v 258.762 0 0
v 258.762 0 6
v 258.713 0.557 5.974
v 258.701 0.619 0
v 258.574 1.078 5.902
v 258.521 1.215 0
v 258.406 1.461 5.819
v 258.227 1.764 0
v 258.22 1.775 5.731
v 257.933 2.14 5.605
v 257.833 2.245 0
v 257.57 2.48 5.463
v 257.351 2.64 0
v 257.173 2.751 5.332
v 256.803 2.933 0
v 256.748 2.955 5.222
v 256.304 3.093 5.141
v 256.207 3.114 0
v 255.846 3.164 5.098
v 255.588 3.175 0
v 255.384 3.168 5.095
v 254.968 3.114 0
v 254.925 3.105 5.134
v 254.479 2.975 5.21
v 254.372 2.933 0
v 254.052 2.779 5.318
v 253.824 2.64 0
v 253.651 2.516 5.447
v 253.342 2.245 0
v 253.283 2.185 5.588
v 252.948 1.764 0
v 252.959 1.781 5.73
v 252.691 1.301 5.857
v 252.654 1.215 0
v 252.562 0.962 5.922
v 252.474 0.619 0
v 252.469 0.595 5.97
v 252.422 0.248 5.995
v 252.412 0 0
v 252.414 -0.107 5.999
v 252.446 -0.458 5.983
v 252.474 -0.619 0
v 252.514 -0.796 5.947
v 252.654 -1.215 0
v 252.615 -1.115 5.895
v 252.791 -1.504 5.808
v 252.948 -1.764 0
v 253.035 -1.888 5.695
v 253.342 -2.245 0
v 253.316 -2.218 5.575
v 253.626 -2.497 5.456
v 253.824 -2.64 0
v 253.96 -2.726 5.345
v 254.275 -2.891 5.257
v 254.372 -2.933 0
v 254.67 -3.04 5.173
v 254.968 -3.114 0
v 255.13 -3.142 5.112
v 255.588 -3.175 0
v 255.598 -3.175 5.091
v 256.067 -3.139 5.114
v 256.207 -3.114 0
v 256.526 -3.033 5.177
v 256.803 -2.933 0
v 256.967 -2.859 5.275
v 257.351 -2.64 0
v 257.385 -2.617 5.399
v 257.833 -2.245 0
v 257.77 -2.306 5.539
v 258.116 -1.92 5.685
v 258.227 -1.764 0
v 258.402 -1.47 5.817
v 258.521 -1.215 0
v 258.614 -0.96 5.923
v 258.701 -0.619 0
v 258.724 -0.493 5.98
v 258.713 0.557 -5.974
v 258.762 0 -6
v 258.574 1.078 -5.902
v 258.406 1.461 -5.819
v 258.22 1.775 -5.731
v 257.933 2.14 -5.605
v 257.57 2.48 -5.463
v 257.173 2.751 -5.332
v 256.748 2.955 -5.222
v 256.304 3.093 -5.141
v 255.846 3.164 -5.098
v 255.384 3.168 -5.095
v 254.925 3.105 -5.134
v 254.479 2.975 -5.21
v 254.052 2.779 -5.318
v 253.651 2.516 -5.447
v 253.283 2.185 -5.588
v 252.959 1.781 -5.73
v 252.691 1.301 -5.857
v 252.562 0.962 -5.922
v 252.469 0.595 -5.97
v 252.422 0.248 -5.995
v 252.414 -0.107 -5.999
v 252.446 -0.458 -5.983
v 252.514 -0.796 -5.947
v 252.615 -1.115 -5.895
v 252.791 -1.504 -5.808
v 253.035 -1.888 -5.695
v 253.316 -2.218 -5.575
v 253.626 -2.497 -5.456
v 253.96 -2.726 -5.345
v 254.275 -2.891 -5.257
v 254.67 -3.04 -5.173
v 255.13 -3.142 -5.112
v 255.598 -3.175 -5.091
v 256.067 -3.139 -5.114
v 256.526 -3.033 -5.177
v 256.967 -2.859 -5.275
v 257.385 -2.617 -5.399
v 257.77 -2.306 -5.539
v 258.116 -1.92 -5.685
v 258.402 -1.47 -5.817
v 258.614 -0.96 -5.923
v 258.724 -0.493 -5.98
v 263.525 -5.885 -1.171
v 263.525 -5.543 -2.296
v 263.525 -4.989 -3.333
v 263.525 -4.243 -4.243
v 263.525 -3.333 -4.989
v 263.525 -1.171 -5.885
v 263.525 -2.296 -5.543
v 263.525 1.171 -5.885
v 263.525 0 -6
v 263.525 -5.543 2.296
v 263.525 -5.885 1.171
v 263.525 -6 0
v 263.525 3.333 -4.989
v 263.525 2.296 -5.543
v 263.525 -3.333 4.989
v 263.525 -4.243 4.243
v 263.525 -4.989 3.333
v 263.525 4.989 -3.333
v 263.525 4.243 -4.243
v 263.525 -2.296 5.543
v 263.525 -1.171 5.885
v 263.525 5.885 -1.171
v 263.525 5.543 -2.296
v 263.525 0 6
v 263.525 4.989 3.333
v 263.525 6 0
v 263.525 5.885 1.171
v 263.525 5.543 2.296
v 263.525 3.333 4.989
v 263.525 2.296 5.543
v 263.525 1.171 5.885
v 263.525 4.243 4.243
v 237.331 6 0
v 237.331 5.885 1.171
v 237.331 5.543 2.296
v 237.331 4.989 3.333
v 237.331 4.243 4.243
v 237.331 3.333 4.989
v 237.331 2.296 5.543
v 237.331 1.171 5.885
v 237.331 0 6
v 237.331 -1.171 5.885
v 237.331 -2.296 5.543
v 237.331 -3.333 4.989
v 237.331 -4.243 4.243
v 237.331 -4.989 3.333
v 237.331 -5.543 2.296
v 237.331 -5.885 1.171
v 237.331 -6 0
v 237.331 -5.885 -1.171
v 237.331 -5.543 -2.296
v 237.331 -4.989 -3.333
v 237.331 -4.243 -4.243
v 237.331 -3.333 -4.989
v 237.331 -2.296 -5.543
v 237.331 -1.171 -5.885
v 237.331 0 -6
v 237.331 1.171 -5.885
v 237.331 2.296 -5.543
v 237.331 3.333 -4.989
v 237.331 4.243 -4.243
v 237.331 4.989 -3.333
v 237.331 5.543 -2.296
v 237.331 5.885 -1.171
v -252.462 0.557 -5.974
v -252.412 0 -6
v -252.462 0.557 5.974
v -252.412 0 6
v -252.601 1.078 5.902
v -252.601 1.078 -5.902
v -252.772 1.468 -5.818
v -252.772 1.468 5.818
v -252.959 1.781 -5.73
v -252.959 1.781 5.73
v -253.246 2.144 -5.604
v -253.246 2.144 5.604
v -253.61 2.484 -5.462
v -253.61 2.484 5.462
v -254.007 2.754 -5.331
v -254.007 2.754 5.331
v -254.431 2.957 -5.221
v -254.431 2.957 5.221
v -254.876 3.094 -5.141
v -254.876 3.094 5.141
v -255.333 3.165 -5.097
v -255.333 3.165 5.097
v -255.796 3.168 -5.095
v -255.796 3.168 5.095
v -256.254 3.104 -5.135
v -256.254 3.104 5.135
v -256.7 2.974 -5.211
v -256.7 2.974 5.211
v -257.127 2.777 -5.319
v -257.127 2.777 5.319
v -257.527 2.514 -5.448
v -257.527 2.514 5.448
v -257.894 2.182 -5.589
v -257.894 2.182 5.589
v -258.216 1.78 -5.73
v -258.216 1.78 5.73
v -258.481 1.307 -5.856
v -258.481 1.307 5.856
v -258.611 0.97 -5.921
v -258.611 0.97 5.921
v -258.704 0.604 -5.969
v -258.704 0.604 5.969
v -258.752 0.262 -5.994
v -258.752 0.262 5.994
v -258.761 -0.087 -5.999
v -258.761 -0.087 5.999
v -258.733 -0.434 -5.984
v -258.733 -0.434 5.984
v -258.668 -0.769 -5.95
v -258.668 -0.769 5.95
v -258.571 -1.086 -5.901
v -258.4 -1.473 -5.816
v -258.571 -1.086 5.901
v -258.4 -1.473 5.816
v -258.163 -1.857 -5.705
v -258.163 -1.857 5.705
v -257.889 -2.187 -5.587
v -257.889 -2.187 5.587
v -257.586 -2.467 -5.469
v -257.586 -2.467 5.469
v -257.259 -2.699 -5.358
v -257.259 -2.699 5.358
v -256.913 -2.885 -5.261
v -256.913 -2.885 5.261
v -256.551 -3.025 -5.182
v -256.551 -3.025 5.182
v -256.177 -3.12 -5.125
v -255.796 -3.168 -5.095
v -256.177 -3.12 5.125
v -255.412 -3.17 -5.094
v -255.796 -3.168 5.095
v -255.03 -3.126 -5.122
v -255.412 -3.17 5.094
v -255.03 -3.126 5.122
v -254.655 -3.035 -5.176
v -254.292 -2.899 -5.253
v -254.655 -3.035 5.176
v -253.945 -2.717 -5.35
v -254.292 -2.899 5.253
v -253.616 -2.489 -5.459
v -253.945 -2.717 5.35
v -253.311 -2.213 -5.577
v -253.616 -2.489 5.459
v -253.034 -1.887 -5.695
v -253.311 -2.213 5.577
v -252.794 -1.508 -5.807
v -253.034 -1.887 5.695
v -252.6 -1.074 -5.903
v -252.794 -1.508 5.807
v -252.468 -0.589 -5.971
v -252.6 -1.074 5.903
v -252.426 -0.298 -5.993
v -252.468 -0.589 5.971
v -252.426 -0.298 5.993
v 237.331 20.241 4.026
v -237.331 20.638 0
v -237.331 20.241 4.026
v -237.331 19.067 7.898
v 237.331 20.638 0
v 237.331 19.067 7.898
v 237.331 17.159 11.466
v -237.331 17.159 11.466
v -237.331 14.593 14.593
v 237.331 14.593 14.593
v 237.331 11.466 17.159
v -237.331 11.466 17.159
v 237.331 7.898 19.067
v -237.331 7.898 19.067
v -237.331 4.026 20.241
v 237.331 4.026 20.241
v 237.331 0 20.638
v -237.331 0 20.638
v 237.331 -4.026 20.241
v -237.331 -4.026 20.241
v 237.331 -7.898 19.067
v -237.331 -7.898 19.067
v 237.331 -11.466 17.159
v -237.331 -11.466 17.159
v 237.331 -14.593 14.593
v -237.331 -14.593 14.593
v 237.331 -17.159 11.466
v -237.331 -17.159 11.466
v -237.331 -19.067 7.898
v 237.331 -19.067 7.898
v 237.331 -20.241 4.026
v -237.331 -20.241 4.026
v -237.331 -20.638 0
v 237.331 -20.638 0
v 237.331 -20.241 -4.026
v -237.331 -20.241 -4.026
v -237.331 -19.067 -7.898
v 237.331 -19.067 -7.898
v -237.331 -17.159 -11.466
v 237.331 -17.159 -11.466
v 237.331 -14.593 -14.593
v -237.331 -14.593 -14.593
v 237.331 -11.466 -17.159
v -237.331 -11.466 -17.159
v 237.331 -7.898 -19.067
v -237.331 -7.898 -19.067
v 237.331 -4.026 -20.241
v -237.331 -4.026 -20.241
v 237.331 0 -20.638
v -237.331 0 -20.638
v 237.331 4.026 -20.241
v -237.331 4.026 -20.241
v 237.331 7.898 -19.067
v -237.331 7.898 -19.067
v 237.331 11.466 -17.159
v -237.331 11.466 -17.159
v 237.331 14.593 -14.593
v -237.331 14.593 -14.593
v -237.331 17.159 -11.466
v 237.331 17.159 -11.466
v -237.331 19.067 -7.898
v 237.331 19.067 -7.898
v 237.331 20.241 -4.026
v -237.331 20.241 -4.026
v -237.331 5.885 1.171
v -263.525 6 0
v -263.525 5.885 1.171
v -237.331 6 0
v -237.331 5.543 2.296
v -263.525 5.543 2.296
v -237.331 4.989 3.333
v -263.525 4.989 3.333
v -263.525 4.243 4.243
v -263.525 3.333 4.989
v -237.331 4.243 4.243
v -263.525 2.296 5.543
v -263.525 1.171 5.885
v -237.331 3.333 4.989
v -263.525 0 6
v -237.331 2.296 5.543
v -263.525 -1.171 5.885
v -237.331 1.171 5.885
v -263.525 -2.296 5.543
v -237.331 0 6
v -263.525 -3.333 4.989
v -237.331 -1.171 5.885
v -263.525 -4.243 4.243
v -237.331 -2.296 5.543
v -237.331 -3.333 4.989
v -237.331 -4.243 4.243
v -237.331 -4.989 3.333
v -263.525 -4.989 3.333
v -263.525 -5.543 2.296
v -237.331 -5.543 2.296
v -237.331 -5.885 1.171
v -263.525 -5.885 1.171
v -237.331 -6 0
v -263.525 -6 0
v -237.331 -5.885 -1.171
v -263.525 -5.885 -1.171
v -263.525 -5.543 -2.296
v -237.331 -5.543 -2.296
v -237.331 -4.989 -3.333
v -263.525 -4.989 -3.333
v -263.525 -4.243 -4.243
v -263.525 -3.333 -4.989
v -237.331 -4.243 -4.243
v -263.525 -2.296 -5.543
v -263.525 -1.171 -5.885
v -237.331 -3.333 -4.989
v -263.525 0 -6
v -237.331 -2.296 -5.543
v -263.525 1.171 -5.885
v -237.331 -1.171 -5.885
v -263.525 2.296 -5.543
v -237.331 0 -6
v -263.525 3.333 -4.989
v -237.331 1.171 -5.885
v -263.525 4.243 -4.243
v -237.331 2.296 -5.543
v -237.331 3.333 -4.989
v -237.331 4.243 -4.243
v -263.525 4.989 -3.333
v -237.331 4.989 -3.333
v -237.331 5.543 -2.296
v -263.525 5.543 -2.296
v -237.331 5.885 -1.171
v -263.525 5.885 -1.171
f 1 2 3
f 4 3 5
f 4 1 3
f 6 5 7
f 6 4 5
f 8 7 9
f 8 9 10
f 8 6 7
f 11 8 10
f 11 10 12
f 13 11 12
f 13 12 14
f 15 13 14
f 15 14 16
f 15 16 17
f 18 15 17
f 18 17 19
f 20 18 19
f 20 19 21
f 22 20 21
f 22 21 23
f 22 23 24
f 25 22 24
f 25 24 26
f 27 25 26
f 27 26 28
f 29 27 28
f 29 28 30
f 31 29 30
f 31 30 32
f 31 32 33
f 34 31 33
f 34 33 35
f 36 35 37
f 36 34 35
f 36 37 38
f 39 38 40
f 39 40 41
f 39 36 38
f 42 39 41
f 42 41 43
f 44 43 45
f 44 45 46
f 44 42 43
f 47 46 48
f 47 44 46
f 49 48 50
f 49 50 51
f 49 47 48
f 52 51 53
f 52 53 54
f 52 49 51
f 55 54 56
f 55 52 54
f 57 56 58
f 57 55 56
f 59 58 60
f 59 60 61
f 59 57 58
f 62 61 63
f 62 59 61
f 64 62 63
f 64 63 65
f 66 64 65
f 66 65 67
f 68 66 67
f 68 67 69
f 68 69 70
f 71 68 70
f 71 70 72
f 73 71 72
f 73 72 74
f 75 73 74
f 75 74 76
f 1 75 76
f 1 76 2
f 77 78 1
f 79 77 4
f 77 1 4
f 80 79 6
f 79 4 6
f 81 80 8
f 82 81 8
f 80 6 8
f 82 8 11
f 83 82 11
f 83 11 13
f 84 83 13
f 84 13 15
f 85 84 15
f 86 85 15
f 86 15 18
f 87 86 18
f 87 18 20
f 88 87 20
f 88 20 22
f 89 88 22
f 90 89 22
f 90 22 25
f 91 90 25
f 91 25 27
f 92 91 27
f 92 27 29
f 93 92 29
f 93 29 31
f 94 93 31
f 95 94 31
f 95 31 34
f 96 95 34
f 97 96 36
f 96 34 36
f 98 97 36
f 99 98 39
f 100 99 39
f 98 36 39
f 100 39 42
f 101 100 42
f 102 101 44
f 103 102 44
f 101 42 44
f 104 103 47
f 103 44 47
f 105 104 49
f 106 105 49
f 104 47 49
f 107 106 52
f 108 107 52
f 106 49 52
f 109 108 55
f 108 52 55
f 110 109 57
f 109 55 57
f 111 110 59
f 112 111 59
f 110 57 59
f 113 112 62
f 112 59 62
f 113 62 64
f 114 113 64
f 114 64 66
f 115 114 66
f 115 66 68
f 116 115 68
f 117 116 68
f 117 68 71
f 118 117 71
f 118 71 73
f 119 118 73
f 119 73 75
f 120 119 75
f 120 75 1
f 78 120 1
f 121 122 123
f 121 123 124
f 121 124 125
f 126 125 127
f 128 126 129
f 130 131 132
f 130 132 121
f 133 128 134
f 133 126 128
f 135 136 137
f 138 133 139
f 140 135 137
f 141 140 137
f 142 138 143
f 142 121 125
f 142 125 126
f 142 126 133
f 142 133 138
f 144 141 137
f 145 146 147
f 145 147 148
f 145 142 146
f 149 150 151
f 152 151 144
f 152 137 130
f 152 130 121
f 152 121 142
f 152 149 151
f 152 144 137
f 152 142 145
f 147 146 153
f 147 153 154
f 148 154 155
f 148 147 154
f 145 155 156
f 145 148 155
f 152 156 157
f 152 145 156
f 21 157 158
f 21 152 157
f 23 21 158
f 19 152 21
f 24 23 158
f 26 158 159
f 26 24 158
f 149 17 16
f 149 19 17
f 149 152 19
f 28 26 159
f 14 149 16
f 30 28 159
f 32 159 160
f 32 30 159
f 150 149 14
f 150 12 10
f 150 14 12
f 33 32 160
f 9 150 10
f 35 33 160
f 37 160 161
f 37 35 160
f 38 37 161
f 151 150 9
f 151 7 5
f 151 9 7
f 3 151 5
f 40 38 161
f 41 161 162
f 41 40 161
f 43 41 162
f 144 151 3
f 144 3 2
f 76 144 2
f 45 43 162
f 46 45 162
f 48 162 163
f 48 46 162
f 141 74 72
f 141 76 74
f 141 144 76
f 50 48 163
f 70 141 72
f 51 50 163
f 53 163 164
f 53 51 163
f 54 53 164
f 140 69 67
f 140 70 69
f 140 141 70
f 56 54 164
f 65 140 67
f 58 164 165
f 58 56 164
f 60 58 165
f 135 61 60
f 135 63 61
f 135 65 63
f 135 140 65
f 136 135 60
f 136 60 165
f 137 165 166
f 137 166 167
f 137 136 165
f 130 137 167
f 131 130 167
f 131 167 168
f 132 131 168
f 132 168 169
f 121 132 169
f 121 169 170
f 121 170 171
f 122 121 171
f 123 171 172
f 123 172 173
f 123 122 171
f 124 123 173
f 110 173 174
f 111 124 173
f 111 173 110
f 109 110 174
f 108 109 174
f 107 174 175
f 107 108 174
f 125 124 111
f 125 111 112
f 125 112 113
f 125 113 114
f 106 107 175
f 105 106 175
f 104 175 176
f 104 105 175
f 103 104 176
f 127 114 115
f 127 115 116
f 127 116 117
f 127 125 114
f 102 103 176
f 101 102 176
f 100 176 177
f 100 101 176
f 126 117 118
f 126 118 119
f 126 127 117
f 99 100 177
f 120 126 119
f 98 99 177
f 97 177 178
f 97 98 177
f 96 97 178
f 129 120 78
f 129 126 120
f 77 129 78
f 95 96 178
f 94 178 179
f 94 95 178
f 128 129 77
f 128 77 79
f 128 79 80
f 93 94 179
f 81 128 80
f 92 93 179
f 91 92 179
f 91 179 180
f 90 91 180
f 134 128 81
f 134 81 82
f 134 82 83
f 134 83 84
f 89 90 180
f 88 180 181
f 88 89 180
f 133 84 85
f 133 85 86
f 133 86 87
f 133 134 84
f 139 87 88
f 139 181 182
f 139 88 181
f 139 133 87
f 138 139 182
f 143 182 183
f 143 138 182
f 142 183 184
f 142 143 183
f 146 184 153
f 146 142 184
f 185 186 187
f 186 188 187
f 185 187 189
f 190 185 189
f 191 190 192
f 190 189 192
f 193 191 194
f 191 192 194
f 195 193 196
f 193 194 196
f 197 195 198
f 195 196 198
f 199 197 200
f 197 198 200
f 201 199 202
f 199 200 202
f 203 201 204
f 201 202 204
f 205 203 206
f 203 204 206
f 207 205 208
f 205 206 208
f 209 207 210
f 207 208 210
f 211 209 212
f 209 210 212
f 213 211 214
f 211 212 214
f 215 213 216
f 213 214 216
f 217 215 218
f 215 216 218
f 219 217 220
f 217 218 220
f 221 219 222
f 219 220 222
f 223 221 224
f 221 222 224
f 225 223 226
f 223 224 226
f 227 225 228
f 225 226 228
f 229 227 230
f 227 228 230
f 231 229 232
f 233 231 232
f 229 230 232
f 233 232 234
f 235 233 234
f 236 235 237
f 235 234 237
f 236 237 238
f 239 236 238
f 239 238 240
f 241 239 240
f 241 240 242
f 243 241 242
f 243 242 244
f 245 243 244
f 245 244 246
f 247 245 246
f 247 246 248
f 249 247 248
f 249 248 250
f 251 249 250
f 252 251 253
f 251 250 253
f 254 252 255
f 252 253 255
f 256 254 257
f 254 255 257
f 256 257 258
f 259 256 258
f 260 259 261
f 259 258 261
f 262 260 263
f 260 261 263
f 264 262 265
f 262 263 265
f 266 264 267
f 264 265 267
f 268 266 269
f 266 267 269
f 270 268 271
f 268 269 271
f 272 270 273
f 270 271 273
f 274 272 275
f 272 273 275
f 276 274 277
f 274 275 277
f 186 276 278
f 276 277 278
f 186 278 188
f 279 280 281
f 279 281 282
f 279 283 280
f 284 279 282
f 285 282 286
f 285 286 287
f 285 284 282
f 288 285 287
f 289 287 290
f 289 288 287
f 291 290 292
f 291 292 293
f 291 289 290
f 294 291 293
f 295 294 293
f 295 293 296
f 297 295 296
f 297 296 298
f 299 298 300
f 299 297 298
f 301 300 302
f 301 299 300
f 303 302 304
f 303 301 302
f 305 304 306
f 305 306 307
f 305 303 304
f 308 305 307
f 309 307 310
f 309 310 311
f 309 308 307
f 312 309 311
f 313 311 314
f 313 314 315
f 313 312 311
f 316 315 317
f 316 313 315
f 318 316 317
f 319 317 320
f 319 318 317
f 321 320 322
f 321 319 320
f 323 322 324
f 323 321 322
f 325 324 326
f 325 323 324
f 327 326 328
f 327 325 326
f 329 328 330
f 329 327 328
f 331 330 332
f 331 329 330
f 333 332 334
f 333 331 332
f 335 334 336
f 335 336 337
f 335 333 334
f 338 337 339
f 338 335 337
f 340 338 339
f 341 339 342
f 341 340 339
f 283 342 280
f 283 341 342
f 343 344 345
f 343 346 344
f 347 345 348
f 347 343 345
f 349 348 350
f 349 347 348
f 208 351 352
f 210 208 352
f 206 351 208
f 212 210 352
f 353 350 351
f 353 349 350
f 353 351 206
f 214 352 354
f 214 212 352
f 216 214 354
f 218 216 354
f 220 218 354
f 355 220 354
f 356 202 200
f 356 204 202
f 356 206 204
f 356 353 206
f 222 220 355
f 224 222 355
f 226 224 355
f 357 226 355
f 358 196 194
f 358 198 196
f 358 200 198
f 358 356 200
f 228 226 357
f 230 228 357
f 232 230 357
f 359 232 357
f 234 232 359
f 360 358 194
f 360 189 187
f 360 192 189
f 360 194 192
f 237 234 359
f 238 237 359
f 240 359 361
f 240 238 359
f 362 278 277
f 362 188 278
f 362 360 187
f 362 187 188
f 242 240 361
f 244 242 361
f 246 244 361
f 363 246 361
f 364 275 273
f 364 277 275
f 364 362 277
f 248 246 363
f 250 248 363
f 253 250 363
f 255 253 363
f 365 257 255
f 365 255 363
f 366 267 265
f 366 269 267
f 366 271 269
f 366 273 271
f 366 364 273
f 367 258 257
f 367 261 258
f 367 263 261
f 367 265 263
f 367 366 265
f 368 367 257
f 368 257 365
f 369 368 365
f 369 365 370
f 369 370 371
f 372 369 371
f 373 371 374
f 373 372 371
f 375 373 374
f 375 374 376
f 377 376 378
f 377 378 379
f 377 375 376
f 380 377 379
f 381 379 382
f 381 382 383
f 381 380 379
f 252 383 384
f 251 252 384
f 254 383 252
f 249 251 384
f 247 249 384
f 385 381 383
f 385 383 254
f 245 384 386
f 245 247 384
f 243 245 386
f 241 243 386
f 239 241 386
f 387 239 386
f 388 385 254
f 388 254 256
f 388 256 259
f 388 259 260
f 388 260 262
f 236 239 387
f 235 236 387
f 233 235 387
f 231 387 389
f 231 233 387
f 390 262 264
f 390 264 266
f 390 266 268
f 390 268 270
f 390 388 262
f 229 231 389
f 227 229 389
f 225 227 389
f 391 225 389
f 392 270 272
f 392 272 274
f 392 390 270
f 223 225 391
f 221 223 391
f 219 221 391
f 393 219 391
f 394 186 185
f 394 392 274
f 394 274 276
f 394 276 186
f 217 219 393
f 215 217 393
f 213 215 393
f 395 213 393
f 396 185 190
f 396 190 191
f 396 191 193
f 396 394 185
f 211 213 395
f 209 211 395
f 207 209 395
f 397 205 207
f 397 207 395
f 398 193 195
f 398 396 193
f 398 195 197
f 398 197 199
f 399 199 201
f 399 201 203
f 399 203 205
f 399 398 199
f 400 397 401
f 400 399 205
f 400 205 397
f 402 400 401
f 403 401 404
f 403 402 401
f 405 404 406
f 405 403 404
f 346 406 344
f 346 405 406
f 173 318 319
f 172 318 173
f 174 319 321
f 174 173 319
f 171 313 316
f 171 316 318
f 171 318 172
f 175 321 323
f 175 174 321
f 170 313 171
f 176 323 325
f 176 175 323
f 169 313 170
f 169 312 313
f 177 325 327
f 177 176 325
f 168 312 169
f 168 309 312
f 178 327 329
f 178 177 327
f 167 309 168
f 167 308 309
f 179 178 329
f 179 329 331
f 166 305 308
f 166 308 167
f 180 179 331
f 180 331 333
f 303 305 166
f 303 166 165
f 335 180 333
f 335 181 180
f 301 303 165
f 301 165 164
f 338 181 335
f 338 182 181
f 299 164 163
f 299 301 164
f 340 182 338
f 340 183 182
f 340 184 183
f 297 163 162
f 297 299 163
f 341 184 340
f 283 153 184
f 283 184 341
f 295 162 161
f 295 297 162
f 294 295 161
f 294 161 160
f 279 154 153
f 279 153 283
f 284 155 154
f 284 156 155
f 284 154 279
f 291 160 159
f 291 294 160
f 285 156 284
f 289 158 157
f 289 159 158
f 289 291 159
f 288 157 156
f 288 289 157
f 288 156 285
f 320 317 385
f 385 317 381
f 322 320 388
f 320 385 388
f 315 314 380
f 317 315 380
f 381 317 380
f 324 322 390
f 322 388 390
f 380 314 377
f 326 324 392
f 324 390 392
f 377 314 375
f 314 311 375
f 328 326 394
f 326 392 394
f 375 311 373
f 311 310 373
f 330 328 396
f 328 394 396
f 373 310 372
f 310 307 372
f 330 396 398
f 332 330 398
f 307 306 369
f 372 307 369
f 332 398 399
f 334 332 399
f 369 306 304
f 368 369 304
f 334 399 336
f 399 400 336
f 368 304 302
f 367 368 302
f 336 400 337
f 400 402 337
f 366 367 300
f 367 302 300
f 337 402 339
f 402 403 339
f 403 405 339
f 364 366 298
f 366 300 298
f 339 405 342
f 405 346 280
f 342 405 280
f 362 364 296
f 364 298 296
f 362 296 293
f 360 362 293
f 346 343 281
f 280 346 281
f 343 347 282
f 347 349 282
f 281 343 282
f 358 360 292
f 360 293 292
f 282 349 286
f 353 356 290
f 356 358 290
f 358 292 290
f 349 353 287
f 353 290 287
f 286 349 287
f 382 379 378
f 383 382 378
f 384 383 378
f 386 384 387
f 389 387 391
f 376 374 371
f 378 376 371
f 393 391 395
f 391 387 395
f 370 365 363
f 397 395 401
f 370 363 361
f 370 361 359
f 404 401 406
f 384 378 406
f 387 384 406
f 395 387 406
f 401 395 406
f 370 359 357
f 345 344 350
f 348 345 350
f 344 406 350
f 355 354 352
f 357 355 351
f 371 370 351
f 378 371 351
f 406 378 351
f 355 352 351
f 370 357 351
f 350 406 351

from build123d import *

# Parameters (mm, degrees)
F0_R     = 20.6375
F0_R_2   = 6
F1_DEPTH = 237.33125
F2_DEPTH = 263.525
F3_R     = 3.175
F4_DEPTH = 6.35


with BuildPart() as f1:
    # F0 (on Right) → F1 (new body, symmetric)
    with BuildSketch(Plane.YZ):
        Circle(F0_R)
        Circle(F0_R_2, mode=Mode.SUBTRACT)
    extrude(amount=F1_DEPTH, both=True)

    # F0 (on Right) → F2 (join, symmetric)
    with BuildSketch(Plane.YZ):
        Circle(F0_R_2)
    extrude(amount=F2_DEPTH, both=True)

    # F3 (on Top) → F4 (cut, symmetric)
    with BuildSketch(Plane.XY):
        with Locations((255.5875, 0)):
            Circle(F3_R)
        with Locations((-255.5875, 0)):
            Circle(F3_R)
    extrude(amount=F4_DEPTH, both=True, mode=Mode.SUBTRACT)


solid = f1.part
